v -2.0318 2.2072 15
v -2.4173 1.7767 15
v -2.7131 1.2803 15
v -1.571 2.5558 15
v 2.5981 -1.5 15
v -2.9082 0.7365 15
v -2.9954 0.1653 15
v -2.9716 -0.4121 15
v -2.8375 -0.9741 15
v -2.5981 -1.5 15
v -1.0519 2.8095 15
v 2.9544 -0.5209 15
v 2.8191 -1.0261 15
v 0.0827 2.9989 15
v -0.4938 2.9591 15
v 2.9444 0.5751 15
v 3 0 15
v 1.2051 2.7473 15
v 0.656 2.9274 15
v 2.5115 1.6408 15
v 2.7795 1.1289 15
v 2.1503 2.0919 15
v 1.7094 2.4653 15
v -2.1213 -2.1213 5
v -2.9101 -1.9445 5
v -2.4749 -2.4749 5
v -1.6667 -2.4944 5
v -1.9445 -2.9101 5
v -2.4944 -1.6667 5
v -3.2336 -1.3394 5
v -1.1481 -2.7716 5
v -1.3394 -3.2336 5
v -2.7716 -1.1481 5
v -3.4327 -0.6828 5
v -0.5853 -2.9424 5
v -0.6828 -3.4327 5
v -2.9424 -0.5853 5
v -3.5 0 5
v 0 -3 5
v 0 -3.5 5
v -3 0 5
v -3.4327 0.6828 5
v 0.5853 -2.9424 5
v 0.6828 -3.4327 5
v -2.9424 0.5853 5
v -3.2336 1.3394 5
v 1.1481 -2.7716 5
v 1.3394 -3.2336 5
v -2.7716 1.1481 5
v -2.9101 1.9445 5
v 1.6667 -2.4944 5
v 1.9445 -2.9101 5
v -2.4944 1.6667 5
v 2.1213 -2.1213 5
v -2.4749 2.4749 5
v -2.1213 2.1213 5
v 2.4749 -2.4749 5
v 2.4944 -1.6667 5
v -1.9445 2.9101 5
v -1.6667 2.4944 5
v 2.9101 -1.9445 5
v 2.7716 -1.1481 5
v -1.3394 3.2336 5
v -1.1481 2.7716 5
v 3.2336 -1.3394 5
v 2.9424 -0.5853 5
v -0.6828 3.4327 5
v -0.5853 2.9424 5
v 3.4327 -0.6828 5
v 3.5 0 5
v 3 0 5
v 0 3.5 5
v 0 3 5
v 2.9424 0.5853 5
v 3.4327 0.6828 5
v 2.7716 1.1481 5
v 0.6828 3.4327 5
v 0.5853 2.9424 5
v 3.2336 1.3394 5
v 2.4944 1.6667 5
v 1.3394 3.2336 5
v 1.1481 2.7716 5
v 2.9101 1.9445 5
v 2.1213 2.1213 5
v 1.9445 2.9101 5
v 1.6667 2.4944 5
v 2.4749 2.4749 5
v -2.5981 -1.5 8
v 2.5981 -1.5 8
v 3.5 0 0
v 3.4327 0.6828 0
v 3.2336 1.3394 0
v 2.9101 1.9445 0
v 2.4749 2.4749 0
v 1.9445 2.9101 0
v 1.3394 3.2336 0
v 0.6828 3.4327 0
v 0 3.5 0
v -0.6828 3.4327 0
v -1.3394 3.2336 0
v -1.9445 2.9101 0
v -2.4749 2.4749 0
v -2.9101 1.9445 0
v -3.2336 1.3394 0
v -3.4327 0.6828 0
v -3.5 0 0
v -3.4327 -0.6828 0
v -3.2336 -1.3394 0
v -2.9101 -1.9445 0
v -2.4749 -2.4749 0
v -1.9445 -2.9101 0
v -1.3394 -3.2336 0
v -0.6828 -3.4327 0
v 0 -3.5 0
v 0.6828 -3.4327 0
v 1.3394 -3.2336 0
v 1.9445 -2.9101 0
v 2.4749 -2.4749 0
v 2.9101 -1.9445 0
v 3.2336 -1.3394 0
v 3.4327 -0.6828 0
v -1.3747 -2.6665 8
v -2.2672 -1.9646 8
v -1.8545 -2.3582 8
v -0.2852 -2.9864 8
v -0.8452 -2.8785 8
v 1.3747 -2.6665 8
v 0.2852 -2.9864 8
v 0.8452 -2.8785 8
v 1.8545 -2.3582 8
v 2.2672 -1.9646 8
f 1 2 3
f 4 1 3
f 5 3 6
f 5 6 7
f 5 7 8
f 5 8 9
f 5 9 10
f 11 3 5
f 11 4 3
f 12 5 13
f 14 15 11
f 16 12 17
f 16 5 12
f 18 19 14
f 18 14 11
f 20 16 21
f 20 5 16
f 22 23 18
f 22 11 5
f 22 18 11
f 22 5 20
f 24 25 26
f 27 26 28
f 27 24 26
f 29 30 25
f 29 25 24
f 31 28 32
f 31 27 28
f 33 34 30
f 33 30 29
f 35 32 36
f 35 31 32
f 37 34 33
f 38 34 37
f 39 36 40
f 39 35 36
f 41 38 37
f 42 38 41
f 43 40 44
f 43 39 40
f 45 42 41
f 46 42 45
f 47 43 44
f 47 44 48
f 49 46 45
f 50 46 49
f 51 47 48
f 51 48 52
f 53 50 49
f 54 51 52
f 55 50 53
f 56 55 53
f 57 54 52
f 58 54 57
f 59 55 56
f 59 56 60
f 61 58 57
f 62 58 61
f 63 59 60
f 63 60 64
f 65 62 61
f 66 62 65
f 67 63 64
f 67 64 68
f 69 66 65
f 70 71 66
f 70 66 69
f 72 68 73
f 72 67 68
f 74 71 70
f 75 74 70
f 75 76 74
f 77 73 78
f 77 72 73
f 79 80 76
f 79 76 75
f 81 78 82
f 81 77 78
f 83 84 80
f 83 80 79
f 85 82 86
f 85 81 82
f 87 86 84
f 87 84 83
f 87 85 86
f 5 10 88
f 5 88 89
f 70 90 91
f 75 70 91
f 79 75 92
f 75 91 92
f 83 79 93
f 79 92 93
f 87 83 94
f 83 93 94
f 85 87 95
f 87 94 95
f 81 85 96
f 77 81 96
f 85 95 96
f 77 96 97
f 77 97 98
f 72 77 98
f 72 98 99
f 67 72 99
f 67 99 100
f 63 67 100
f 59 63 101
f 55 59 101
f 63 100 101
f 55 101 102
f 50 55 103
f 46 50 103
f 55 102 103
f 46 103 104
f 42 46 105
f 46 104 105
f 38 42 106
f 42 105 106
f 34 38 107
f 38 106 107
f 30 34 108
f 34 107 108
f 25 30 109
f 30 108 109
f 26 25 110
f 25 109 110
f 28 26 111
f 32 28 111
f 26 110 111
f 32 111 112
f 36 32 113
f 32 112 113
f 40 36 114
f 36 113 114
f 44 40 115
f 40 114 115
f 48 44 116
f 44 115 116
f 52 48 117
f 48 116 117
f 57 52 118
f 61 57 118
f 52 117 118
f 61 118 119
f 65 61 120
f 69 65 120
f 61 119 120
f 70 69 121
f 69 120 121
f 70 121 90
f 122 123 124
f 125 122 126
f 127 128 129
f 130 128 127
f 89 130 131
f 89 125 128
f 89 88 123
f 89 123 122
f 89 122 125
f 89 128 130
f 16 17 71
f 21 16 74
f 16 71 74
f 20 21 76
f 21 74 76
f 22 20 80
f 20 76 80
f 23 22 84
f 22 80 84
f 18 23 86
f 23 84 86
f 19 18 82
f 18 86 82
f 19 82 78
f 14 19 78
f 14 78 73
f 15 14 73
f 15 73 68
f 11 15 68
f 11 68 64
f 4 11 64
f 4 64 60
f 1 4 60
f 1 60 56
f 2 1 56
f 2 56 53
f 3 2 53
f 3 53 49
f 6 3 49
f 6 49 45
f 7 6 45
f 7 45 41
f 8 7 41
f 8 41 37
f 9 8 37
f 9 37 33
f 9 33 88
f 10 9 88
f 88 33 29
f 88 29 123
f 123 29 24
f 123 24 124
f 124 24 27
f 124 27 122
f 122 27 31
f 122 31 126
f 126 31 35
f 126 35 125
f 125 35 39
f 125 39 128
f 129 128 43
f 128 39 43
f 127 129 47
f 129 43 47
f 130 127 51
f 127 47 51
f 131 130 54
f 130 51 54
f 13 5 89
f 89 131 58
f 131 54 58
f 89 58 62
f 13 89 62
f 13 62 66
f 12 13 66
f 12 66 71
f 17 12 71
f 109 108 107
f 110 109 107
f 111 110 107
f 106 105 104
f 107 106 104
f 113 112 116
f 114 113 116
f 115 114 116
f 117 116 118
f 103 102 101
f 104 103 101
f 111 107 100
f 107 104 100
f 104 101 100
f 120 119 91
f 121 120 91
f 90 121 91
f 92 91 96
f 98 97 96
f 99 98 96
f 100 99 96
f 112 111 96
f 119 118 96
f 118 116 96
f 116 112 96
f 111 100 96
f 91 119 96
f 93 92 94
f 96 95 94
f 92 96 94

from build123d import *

# Parameters (mm, degrees)
SKETCH_R     = 3.5
PAD_DEPTH    = 5
SKETCH002_R  = 3
PAD001_DEPTH = 15
SKETCH003_W  = 6
SKETCH003_H  = 1.5
POCKET_DEPTH = 7


with BuildPart() as part:
    # Sketch → Pad (new body)
    with BuildSketch(Plane.XY):
        Circle(SKETCH_R)
    extrude(amount=PAD_DEPTH)

    # Sketch002 → Pad001 (join)
    with BuildSketch(Plane.XY):
        Circle(SKETCH002_R)
    extrude(amount=PAD001_DEPTH)

    # Sketch003 (on DatumPlane) → Pocket (cut)
    with BuildSketch(Plane.XY.offset(15)):
        with Locations((0, -2.25)):
            Rectangle(SKETCH003_W, SKETCH003_H)
    extrude(amount=-POCKET_DEPTH, mode=Mode.SUBTRACT)


solid = part.part
